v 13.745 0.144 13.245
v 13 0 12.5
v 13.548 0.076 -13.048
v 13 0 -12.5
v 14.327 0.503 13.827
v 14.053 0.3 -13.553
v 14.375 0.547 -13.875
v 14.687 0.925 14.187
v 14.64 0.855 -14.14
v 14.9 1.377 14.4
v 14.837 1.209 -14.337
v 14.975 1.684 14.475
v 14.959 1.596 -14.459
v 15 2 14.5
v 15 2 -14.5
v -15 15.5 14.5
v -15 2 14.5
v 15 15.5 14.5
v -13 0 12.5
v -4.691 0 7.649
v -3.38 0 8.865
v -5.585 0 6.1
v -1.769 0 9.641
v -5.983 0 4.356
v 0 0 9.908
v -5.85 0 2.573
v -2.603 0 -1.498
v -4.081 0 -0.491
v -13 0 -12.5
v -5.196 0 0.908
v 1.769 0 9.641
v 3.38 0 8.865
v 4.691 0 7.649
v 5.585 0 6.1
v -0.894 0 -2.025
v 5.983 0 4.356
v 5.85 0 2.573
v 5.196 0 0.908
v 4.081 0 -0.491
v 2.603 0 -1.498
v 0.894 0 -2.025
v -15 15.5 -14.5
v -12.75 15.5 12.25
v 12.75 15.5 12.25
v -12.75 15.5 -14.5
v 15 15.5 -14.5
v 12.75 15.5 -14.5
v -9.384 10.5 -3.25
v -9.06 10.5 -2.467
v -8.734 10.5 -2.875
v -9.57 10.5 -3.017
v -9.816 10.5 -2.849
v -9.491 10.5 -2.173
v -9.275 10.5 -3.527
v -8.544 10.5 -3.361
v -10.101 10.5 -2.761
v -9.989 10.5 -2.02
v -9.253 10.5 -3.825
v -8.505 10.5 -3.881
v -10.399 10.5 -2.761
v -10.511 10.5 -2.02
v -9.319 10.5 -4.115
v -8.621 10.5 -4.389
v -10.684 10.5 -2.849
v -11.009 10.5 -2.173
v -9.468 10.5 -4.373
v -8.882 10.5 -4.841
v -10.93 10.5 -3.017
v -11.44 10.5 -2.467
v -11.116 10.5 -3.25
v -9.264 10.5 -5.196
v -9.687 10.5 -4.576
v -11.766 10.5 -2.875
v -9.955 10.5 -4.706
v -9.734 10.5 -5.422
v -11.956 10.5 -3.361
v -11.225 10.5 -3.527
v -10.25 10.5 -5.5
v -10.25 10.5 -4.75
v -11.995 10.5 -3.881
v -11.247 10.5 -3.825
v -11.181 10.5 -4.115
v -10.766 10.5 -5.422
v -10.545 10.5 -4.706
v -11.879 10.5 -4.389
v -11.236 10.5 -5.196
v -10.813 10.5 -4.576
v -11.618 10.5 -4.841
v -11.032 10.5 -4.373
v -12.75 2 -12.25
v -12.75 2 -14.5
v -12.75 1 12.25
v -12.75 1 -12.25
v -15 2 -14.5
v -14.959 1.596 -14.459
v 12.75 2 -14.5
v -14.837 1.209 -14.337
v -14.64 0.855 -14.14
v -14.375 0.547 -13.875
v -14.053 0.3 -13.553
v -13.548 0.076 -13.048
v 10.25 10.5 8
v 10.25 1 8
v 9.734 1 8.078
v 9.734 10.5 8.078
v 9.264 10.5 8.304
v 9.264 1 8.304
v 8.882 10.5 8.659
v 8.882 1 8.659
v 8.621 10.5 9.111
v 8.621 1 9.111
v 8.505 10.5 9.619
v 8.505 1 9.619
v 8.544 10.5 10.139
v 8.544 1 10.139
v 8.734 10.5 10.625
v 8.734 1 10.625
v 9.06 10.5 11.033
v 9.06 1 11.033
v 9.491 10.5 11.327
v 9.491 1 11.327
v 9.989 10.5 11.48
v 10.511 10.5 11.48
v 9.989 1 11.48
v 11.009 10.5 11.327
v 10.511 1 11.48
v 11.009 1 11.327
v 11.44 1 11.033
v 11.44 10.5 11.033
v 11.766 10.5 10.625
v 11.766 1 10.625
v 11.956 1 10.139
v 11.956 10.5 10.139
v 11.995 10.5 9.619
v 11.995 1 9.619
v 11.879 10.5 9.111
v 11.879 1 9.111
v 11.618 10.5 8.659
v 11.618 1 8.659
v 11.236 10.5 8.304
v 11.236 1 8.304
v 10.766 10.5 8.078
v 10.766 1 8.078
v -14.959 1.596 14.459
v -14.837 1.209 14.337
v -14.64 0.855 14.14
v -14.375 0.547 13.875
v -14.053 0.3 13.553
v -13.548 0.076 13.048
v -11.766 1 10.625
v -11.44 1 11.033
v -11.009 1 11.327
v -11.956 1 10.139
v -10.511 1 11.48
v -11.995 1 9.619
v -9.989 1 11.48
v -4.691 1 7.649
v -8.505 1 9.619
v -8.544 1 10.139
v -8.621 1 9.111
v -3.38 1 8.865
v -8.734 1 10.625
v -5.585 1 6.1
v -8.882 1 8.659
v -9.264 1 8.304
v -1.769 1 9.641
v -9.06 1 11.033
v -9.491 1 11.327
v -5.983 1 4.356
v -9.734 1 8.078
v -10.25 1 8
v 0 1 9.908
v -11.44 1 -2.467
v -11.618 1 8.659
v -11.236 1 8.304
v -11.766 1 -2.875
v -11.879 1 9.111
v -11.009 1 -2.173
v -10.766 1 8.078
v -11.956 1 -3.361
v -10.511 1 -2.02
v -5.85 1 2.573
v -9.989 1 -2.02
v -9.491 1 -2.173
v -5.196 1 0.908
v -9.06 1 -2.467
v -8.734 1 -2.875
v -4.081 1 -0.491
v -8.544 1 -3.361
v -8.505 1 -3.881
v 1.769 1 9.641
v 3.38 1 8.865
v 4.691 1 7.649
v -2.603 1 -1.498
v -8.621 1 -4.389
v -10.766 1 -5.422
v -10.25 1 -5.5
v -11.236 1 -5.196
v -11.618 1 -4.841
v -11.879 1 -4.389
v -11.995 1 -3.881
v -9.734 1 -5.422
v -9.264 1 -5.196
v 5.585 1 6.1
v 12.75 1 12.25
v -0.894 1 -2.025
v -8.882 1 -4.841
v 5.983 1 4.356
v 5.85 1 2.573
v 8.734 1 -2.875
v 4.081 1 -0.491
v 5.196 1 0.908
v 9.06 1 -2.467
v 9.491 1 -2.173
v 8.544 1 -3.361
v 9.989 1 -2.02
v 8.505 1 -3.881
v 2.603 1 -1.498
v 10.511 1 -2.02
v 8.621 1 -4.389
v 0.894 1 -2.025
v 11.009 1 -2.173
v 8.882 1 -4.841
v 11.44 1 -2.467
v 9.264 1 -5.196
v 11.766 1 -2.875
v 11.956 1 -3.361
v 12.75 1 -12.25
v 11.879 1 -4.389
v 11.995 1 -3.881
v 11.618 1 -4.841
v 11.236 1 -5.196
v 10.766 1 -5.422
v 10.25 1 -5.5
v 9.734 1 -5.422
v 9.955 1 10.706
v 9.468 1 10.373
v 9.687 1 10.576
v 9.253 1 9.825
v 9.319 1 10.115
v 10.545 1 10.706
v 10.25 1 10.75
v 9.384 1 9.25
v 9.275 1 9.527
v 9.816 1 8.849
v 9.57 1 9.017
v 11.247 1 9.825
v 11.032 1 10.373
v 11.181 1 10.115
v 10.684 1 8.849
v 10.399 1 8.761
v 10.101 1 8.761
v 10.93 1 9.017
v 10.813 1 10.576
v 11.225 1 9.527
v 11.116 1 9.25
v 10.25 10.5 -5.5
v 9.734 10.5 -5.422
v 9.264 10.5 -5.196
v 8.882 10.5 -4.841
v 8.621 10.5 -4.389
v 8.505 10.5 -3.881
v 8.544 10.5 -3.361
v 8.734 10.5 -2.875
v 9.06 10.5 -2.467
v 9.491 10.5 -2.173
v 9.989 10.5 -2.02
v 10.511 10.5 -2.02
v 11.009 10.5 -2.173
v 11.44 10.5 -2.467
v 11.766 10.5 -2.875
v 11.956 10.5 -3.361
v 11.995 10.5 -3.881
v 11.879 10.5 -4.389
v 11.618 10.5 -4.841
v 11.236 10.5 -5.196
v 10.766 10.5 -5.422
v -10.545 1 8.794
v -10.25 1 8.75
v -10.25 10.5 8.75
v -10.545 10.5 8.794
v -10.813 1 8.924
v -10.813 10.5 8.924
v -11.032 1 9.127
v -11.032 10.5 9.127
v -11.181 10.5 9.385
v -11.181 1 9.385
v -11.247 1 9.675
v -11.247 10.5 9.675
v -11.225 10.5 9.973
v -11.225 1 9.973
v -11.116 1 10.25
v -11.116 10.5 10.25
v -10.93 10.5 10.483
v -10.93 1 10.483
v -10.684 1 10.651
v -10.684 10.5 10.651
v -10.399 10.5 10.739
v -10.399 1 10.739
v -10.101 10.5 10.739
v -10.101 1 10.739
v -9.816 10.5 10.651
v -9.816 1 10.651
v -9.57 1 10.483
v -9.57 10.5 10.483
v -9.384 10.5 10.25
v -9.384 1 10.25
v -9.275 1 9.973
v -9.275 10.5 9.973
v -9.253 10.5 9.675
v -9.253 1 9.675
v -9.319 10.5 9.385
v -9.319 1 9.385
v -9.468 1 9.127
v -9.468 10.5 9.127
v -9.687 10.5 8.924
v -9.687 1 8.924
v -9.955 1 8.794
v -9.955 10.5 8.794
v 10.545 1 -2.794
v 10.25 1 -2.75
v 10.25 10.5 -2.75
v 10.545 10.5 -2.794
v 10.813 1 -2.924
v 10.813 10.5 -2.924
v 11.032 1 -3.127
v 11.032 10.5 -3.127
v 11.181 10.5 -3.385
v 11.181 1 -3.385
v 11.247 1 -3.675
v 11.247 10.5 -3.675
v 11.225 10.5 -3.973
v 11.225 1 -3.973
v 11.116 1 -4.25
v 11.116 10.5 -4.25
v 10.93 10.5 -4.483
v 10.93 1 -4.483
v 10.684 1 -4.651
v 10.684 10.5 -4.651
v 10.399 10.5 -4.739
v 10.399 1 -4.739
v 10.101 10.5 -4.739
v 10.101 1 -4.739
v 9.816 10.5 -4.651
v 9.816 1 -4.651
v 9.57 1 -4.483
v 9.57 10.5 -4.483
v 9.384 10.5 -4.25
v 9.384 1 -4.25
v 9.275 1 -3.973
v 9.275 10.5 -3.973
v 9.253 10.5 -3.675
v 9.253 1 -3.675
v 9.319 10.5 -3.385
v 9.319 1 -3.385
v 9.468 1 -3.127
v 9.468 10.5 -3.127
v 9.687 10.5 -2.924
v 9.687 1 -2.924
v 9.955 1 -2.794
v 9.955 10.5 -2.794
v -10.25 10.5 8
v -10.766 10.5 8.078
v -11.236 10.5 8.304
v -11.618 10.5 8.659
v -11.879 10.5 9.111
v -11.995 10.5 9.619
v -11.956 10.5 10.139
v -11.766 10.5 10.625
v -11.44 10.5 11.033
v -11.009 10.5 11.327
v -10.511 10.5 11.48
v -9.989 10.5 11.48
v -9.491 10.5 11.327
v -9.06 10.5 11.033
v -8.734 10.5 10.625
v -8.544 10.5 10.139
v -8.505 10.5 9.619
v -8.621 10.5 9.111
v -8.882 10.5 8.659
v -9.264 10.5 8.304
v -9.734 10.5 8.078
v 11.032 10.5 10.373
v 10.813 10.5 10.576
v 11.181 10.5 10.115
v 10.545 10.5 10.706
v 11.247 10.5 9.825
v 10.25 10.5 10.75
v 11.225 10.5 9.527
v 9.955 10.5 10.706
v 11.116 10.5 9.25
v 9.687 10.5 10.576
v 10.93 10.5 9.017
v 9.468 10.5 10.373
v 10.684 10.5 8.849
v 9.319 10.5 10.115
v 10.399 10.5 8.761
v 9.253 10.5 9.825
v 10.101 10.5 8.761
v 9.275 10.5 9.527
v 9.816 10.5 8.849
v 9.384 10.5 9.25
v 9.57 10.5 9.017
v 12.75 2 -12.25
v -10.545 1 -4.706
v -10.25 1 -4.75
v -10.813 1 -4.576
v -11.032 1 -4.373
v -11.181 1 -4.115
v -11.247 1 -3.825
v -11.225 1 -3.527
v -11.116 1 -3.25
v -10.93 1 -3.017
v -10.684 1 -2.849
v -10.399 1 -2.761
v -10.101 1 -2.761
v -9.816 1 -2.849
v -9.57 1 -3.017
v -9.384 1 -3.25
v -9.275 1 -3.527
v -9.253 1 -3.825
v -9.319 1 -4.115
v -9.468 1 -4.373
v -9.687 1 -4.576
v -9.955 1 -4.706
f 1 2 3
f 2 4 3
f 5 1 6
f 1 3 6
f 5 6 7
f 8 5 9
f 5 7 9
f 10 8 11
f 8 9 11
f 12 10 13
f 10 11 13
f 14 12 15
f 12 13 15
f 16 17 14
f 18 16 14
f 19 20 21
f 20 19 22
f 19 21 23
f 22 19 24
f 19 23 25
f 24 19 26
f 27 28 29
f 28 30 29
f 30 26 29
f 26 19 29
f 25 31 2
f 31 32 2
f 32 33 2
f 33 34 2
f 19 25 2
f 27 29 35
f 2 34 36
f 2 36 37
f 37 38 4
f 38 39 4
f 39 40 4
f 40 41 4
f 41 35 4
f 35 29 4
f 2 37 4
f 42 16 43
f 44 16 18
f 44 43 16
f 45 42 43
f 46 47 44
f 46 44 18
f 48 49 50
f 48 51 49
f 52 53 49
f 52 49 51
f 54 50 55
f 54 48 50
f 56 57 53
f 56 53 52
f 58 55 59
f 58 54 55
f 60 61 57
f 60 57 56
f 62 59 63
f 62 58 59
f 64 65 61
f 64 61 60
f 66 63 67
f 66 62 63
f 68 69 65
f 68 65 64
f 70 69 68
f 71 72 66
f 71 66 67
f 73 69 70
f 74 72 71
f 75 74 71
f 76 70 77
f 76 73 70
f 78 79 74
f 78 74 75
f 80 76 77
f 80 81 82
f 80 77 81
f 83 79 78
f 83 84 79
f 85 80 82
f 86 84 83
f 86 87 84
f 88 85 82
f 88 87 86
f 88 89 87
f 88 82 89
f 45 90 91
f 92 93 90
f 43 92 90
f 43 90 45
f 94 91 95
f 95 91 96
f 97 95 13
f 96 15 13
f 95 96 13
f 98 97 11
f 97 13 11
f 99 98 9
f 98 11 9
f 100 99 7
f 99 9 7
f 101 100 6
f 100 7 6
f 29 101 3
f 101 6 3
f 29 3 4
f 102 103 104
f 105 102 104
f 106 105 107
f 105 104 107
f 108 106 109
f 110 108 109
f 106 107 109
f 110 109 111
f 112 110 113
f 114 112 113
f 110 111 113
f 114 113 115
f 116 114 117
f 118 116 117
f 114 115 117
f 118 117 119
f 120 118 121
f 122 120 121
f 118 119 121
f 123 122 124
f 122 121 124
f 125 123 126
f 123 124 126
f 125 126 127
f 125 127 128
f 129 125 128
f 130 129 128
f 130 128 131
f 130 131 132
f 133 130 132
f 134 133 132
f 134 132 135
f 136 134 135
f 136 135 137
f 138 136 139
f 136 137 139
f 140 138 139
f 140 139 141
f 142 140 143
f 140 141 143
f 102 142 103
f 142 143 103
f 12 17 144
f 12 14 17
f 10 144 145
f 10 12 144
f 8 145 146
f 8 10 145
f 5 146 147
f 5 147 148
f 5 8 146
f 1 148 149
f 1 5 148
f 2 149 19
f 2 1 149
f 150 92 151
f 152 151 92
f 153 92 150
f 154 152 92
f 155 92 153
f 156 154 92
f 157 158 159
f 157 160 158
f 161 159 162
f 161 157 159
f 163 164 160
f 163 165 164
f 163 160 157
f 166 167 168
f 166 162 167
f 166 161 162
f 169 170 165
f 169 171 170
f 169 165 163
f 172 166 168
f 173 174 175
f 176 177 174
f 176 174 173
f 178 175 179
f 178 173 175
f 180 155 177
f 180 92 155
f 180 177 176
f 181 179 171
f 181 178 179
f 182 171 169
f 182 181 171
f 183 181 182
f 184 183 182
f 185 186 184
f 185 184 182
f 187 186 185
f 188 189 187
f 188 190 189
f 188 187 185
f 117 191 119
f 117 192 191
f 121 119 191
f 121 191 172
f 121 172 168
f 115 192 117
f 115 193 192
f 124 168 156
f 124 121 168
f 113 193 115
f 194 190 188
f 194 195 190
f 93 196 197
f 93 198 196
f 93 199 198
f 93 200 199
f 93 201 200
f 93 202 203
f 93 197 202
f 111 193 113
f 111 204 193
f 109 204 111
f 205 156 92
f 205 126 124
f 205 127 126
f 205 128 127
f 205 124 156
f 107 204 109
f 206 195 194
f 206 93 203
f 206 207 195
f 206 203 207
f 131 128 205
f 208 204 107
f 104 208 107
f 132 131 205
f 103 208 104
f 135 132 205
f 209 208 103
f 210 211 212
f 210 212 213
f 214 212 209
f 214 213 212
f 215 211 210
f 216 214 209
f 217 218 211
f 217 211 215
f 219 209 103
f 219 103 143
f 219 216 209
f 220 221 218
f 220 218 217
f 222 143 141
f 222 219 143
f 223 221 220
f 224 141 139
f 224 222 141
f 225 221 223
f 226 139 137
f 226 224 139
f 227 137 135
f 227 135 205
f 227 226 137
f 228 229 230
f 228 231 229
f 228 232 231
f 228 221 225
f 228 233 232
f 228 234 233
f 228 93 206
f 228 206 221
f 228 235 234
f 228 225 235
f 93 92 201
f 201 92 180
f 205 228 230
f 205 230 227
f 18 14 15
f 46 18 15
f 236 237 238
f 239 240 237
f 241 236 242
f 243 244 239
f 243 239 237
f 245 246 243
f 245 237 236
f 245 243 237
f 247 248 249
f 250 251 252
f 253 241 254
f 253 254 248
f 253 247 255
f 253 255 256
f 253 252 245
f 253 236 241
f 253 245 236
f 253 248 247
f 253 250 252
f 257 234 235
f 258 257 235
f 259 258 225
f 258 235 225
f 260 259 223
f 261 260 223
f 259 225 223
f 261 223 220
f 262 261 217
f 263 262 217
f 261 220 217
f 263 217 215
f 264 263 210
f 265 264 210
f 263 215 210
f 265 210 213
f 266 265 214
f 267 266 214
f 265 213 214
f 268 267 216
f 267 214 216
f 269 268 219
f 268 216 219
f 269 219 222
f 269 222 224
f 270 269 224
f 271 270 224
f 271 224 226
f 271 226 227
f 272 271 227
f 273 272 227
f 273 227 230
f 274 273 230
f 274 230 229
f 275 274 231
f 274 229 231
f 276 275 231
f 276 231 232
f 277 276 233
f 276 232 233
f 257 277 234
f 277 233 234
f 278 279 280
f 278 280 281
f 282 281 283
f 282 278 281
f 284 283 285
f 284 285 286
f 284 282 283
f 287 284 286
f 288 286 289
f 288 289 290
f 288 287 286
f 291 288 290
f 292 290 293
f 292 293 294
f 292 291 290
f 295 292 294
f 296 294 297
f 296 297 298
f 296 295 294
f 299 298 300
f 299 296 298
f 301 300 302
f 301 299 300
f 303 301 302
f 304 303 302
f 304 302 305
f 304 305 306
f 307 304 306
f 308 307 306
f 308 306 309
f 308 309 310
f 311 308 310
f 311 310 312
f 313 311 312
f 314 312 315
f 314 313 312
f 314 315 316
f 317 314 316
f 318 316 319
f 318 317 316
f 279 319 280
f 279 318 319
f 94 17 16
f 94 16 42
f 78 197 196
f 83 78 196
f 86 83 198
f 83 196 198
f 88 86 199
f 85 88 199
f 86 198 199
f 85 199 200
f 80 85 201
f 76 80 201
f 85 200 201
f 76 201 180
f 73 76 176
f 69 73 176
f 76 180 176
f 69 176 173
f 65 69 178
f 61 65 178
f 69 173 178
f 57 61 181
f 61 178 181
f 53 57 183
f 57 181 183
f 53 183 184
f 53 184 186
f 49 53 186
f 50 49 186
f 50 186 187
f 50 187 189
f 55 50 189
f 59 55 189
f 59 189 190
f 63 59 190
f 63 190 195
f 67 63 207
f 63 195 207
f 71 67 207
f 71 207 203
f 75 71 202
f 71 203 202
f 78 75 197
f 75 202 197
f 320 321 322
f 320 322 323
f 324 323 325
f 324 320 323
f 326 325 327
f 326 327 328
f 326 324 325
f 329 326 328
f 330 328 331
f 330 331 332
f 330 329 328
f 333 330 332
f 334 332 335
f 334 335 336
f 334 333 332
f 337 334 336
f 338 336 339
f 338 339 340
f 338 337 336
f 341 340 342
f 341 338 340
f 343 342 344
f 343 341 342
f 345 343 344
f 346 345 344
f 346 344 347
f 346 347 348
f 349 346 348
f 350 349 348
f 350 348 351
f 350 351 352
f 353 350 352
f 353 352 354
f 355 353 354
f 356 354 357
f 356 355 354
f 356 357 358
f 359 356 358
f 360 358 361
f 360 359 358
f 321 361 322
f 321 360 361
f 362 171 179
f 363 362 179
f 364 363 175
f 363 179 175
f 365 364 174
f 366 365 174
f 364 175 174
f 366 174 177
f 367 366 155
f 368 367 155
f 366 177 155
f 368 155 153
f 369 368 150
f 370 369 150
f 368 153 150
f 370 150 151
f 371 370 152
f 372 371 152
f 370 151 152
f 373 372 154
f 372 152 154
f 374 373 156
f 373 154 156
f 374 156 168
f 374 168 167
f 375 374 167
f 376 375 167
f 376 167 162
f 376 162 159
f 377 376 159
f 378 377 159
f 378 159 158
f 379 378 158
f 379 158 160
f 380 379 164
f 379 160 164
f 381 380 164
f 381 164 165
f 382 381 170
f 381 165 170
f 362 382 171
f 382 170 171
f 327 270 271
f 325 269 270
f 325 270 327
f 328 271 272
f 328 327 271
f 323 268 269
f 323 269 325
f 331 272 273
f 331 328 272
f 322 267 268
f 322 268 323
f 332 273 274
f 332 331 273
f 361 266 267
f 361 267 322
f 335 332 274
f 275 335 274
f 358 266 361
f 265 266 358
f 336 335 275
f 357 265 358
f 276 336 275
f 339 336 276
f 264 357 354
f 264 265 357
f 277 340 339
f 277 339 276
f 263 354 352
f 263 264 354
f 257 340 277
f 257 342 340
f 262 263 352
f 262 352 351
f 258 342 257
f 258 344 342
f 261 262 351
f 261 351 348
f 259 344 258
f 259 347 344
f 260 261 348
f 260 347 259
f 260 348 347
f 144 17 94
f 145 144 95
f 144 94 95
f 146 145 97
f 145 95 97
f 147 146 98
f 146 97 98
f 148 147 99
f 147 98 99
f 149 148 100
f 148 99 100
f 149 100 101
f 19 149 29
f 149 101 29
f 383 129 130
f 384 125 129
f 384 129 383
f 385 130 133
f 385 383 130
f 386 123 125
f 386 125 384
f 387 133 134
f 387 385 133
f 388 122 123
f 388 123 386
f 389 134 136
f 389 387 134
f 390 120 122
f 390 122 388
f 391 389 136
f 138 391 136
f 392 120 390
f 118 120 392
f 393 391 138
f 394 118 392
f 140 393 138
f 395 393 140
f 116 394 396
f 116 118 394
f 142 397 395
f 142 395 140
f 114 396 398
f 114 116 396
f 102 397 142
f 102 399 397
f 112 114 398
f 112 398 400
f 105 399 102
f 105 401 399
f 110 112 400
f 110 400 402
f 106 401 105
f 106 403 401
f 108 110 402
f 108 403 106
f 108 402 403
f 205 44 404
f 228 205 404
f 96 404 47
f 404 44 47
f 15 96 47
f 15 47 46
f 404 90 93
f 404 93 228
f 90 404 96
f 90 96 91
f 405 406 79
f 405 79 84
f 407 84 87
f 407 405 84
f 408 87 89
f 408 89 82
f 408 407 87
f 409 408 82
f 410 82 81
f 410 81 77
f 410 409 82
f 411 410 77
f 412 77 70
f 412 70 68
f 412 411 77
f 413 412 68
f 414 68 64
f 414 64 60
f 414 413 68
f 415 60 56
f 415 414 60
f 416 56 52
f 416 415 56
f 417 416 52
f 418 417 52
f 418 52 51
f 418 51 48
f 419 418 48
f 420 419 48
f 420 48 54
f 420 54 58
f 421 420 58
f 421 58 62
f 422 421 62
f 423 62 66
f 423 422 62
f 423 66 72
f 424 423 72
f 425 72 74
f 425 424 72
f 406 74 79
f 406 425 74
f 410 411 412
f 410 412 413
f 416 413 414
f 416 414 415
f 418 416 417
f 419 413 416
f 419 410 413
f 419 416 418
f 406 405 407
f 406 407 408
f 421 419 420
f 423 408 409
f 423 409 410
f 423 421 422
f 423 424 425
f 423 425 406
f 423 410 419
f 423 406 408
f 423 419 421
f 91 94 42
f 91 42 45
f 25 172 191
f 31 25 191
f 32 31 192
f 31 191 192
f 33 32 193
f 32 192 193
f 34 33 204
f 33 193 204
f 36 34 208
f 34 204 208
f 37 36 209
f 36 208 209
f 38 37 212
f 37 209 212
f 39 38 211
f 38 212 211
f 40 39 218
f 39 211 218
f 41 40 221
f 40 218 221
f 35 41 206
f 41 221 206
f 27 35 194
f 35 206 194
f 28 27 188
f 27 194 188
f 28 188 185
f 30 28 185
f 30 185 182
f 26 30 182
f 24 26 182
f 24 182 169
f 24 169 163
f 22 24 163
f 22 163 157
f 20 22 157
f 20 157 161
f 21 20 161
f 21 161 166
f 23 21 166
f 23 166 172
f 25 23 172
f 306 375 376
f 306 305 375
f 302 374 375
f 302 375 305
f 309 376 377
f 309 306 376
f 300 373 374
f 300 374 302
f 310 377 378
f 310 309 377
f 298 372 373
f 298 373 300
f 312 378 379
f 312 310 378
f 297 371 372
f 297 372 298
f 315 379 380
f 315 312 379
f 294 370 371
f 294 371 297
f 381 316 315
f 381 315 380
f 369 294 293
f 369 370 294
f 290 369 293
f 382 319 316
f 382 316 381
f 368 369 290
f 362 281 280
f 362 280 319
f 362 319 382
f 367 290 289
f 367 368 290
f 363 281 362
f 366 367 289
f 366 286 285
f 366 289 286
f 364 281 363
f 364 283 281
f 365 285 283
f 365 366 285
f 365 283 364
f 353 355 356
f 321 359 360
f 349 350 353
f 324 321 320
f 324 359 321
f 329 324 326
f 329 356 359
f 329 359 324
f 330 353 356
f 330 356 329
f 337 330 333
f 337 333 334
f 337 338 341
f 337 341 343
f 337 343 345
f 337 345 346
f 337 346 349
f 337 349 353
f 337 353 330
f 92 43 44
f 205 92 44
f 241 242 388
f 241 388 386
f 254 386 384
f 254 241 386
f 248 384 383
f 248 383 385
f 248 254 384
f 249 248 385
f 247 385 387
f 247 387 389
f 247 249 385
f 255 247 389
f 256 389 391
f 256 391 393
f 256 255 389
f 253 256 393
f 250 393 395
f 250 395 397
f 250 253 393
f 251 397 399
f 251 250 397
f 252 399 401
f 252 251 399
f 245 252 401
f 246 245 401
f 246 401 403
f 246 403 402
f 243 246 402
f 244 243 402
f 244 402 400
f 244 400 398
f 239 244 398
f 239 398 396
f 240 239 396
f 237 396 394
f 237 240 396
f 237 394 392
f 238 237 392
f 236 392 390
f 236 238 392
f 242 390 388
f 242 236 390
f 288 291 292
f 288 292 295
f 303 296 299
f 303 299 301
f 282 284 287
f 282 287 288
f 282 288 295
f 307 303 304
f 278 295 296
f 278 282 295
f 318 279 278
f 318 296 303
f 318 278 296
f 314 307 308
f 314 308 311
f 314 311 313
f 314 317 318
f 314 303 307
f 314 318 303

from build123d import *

# Parameters (mm, degrees)
CROQUIS1_W                 = 30
CROQUIS1_H                 = 29
SALIENTE_EXTRUIR1_DEPTH    = 15.5
CROQUIS2_W                 = 25.5
CROQUIS2_H                 = 24.5
CORTAR_EXTRUIR1_DEPTH      = 14.5
REDONDEO1_R                = 2
CROQUIS5_R                 = 6
CORTAR_EXTRUIR3_DEPTH      = 5
CORTAR_EXTRUIR5_DEPTH      = 0.75
CORTAR_EXTRUIR5_DEPTH_BACK = 3
CROQUIS6_W                 = 25.5
CROQUIS6_H                 = 13.5
CROQUIS3_R                 = 1.75
CROQUIS3_R_2               = 1
SALIENTE_EXTRUIR2_DEPTH    = 9.5


with BuildPart() as part:
    # Croquis1 → Saliente-Extruir1 (new body)
    with BuildSketch(Plane(origin=(0, 0, 0), x_dir=(1, 0, 0), z_dir=(0, 1, 0))):
        Rectangle(CROQUIS1_W, CROQUIS1_H)
    extrude(amount=SALIENTE_EXTRUIR1_DEPTH)

    # Croquis2 → Cortar-Extruir1 (cut)
    with BuildSketch(Plane(origin=(0, 15.5, 0), x_dir=(1, 0, 0), z_dir=(0, 1, 0))):
        Rectangle(CROQUIS2_W, CROQUIS2_H)
    extrude(amount=-CORTAR_EXTRUIR1_DEPTH, mode=Mode.SUBTRACT)

    # Redondeo1
    redondeo1_edges = [part.edges().sort_by_distance(p)[0] for p in [
        (0, 0, -14.5),
        (15, 0, 0),
        (0, 0, 14.5),
        (-15, 0, 0),
    ]]
    fillet(redondeo1_edges, radius=REDONDEO1_R)

    # Croquis5 → Cortar-Extruir3 (cut)
    with BuildSketch(Plane(origin=(0, 1, 0), x_dir=(1, 0, 0), z_dir=(0, 1, 0))):
        with Locations(Location((0, -3.907682746, 0), (0, 0, 270))):
            Circle(CROQUIS5_R)
    extrude(amount=-CORTAR_EXTRUIR3_DEPTH, mode=Mode.SUBTRACT)

    # Croquis6 → Cortar-Extruir5 (cut, two sides: drawn at the far end of the back side and taken through both)
    with BuildSketch(Plane(origin=(0, 0, -14.5), x_dir=(-1, 0, 0), z_dir=(0, 0, -1)).offset(-CORTAR_EXTRUIR5_DEPTH_BACK)):
        with Locations((0, 8.75)):
            Rectangle(CROQUIS6_W, CROQUIS6_H)
    extrude(amount=CORTAR_EXTRUIR5_DEPTH + CORTAR_EXTRUIR5_DEPTH_BACK, mode=Mode.SUBTRACT)

    # Croquis3 → Saliente-Extruir2 (add)
    # profile 1 of 4: a face of its own
    with BuildSketch(Plane(origin=(0, 1, 0), x_dir=(1, 0, 0), z_dir=(0, 1, 0))):
        with Locations(Location((10.25, -9.75, 0), (0, 0, 90))):
            Circle(CROQUIS3_R)
        with Locations(Location((10.25, -9.75, 0), (0, 0, 270))):
            Circle(CROQUIS3_R_2, mode=Mode.SUBTRACT)
    # profile 2 of 4: a face of its own
    with BuildSketch(Plane(origin=(0, 1, 0), x_dir=(1, 0, 0), z_dir=(0, 1, 0))):
        with Locations(Location((10.25, 3.75, 0), (0, 0, 90))):
            Circle(CROQUIS3_R)
        with Locations(Location((10.25, 3.75, 0), (0, 0, 270))):
            Circle(CROQUIS3_R_2, mode=Mode.SUBTRACT)
    # profile 3 of 4: a face of its own
    with BuildSketch(Plane(origin=(0, 1, 0), x_dir=(1, 0, 0), z_dir=(0, 1, 0))):
        with Locations(Location((-10.25, 3.75, 0), (0, 0, 90))):
            Circle(CROQUIS3_R)
        with Locations(Location((-10.25, 3.75, 0), (0, 0, 90))):
            Circle(CROQUIS3_R_2, mode=Mode.SUBTRACT)
    # profile 4 of 4: a face of its own
    with BuildSketch(Plane(origin=(0, 1, 0), x_dir=(1, 0, 0), z_dir=(0, 1, 0))):
        with Locations(Location((-10.25, -9.75, 0), (0, 0, 90))):
            Circle(CROQUIS3_R)
        with Locations(Location((-10.25, -9.75, 0), (0, 0, 90))):
            Circle(CROQUIS3_R_2, mode=Mode.SUBTRACT)
    extrude(amount=SALIENTE_EXTRUIR2_DEPTH)


solid = part.part
